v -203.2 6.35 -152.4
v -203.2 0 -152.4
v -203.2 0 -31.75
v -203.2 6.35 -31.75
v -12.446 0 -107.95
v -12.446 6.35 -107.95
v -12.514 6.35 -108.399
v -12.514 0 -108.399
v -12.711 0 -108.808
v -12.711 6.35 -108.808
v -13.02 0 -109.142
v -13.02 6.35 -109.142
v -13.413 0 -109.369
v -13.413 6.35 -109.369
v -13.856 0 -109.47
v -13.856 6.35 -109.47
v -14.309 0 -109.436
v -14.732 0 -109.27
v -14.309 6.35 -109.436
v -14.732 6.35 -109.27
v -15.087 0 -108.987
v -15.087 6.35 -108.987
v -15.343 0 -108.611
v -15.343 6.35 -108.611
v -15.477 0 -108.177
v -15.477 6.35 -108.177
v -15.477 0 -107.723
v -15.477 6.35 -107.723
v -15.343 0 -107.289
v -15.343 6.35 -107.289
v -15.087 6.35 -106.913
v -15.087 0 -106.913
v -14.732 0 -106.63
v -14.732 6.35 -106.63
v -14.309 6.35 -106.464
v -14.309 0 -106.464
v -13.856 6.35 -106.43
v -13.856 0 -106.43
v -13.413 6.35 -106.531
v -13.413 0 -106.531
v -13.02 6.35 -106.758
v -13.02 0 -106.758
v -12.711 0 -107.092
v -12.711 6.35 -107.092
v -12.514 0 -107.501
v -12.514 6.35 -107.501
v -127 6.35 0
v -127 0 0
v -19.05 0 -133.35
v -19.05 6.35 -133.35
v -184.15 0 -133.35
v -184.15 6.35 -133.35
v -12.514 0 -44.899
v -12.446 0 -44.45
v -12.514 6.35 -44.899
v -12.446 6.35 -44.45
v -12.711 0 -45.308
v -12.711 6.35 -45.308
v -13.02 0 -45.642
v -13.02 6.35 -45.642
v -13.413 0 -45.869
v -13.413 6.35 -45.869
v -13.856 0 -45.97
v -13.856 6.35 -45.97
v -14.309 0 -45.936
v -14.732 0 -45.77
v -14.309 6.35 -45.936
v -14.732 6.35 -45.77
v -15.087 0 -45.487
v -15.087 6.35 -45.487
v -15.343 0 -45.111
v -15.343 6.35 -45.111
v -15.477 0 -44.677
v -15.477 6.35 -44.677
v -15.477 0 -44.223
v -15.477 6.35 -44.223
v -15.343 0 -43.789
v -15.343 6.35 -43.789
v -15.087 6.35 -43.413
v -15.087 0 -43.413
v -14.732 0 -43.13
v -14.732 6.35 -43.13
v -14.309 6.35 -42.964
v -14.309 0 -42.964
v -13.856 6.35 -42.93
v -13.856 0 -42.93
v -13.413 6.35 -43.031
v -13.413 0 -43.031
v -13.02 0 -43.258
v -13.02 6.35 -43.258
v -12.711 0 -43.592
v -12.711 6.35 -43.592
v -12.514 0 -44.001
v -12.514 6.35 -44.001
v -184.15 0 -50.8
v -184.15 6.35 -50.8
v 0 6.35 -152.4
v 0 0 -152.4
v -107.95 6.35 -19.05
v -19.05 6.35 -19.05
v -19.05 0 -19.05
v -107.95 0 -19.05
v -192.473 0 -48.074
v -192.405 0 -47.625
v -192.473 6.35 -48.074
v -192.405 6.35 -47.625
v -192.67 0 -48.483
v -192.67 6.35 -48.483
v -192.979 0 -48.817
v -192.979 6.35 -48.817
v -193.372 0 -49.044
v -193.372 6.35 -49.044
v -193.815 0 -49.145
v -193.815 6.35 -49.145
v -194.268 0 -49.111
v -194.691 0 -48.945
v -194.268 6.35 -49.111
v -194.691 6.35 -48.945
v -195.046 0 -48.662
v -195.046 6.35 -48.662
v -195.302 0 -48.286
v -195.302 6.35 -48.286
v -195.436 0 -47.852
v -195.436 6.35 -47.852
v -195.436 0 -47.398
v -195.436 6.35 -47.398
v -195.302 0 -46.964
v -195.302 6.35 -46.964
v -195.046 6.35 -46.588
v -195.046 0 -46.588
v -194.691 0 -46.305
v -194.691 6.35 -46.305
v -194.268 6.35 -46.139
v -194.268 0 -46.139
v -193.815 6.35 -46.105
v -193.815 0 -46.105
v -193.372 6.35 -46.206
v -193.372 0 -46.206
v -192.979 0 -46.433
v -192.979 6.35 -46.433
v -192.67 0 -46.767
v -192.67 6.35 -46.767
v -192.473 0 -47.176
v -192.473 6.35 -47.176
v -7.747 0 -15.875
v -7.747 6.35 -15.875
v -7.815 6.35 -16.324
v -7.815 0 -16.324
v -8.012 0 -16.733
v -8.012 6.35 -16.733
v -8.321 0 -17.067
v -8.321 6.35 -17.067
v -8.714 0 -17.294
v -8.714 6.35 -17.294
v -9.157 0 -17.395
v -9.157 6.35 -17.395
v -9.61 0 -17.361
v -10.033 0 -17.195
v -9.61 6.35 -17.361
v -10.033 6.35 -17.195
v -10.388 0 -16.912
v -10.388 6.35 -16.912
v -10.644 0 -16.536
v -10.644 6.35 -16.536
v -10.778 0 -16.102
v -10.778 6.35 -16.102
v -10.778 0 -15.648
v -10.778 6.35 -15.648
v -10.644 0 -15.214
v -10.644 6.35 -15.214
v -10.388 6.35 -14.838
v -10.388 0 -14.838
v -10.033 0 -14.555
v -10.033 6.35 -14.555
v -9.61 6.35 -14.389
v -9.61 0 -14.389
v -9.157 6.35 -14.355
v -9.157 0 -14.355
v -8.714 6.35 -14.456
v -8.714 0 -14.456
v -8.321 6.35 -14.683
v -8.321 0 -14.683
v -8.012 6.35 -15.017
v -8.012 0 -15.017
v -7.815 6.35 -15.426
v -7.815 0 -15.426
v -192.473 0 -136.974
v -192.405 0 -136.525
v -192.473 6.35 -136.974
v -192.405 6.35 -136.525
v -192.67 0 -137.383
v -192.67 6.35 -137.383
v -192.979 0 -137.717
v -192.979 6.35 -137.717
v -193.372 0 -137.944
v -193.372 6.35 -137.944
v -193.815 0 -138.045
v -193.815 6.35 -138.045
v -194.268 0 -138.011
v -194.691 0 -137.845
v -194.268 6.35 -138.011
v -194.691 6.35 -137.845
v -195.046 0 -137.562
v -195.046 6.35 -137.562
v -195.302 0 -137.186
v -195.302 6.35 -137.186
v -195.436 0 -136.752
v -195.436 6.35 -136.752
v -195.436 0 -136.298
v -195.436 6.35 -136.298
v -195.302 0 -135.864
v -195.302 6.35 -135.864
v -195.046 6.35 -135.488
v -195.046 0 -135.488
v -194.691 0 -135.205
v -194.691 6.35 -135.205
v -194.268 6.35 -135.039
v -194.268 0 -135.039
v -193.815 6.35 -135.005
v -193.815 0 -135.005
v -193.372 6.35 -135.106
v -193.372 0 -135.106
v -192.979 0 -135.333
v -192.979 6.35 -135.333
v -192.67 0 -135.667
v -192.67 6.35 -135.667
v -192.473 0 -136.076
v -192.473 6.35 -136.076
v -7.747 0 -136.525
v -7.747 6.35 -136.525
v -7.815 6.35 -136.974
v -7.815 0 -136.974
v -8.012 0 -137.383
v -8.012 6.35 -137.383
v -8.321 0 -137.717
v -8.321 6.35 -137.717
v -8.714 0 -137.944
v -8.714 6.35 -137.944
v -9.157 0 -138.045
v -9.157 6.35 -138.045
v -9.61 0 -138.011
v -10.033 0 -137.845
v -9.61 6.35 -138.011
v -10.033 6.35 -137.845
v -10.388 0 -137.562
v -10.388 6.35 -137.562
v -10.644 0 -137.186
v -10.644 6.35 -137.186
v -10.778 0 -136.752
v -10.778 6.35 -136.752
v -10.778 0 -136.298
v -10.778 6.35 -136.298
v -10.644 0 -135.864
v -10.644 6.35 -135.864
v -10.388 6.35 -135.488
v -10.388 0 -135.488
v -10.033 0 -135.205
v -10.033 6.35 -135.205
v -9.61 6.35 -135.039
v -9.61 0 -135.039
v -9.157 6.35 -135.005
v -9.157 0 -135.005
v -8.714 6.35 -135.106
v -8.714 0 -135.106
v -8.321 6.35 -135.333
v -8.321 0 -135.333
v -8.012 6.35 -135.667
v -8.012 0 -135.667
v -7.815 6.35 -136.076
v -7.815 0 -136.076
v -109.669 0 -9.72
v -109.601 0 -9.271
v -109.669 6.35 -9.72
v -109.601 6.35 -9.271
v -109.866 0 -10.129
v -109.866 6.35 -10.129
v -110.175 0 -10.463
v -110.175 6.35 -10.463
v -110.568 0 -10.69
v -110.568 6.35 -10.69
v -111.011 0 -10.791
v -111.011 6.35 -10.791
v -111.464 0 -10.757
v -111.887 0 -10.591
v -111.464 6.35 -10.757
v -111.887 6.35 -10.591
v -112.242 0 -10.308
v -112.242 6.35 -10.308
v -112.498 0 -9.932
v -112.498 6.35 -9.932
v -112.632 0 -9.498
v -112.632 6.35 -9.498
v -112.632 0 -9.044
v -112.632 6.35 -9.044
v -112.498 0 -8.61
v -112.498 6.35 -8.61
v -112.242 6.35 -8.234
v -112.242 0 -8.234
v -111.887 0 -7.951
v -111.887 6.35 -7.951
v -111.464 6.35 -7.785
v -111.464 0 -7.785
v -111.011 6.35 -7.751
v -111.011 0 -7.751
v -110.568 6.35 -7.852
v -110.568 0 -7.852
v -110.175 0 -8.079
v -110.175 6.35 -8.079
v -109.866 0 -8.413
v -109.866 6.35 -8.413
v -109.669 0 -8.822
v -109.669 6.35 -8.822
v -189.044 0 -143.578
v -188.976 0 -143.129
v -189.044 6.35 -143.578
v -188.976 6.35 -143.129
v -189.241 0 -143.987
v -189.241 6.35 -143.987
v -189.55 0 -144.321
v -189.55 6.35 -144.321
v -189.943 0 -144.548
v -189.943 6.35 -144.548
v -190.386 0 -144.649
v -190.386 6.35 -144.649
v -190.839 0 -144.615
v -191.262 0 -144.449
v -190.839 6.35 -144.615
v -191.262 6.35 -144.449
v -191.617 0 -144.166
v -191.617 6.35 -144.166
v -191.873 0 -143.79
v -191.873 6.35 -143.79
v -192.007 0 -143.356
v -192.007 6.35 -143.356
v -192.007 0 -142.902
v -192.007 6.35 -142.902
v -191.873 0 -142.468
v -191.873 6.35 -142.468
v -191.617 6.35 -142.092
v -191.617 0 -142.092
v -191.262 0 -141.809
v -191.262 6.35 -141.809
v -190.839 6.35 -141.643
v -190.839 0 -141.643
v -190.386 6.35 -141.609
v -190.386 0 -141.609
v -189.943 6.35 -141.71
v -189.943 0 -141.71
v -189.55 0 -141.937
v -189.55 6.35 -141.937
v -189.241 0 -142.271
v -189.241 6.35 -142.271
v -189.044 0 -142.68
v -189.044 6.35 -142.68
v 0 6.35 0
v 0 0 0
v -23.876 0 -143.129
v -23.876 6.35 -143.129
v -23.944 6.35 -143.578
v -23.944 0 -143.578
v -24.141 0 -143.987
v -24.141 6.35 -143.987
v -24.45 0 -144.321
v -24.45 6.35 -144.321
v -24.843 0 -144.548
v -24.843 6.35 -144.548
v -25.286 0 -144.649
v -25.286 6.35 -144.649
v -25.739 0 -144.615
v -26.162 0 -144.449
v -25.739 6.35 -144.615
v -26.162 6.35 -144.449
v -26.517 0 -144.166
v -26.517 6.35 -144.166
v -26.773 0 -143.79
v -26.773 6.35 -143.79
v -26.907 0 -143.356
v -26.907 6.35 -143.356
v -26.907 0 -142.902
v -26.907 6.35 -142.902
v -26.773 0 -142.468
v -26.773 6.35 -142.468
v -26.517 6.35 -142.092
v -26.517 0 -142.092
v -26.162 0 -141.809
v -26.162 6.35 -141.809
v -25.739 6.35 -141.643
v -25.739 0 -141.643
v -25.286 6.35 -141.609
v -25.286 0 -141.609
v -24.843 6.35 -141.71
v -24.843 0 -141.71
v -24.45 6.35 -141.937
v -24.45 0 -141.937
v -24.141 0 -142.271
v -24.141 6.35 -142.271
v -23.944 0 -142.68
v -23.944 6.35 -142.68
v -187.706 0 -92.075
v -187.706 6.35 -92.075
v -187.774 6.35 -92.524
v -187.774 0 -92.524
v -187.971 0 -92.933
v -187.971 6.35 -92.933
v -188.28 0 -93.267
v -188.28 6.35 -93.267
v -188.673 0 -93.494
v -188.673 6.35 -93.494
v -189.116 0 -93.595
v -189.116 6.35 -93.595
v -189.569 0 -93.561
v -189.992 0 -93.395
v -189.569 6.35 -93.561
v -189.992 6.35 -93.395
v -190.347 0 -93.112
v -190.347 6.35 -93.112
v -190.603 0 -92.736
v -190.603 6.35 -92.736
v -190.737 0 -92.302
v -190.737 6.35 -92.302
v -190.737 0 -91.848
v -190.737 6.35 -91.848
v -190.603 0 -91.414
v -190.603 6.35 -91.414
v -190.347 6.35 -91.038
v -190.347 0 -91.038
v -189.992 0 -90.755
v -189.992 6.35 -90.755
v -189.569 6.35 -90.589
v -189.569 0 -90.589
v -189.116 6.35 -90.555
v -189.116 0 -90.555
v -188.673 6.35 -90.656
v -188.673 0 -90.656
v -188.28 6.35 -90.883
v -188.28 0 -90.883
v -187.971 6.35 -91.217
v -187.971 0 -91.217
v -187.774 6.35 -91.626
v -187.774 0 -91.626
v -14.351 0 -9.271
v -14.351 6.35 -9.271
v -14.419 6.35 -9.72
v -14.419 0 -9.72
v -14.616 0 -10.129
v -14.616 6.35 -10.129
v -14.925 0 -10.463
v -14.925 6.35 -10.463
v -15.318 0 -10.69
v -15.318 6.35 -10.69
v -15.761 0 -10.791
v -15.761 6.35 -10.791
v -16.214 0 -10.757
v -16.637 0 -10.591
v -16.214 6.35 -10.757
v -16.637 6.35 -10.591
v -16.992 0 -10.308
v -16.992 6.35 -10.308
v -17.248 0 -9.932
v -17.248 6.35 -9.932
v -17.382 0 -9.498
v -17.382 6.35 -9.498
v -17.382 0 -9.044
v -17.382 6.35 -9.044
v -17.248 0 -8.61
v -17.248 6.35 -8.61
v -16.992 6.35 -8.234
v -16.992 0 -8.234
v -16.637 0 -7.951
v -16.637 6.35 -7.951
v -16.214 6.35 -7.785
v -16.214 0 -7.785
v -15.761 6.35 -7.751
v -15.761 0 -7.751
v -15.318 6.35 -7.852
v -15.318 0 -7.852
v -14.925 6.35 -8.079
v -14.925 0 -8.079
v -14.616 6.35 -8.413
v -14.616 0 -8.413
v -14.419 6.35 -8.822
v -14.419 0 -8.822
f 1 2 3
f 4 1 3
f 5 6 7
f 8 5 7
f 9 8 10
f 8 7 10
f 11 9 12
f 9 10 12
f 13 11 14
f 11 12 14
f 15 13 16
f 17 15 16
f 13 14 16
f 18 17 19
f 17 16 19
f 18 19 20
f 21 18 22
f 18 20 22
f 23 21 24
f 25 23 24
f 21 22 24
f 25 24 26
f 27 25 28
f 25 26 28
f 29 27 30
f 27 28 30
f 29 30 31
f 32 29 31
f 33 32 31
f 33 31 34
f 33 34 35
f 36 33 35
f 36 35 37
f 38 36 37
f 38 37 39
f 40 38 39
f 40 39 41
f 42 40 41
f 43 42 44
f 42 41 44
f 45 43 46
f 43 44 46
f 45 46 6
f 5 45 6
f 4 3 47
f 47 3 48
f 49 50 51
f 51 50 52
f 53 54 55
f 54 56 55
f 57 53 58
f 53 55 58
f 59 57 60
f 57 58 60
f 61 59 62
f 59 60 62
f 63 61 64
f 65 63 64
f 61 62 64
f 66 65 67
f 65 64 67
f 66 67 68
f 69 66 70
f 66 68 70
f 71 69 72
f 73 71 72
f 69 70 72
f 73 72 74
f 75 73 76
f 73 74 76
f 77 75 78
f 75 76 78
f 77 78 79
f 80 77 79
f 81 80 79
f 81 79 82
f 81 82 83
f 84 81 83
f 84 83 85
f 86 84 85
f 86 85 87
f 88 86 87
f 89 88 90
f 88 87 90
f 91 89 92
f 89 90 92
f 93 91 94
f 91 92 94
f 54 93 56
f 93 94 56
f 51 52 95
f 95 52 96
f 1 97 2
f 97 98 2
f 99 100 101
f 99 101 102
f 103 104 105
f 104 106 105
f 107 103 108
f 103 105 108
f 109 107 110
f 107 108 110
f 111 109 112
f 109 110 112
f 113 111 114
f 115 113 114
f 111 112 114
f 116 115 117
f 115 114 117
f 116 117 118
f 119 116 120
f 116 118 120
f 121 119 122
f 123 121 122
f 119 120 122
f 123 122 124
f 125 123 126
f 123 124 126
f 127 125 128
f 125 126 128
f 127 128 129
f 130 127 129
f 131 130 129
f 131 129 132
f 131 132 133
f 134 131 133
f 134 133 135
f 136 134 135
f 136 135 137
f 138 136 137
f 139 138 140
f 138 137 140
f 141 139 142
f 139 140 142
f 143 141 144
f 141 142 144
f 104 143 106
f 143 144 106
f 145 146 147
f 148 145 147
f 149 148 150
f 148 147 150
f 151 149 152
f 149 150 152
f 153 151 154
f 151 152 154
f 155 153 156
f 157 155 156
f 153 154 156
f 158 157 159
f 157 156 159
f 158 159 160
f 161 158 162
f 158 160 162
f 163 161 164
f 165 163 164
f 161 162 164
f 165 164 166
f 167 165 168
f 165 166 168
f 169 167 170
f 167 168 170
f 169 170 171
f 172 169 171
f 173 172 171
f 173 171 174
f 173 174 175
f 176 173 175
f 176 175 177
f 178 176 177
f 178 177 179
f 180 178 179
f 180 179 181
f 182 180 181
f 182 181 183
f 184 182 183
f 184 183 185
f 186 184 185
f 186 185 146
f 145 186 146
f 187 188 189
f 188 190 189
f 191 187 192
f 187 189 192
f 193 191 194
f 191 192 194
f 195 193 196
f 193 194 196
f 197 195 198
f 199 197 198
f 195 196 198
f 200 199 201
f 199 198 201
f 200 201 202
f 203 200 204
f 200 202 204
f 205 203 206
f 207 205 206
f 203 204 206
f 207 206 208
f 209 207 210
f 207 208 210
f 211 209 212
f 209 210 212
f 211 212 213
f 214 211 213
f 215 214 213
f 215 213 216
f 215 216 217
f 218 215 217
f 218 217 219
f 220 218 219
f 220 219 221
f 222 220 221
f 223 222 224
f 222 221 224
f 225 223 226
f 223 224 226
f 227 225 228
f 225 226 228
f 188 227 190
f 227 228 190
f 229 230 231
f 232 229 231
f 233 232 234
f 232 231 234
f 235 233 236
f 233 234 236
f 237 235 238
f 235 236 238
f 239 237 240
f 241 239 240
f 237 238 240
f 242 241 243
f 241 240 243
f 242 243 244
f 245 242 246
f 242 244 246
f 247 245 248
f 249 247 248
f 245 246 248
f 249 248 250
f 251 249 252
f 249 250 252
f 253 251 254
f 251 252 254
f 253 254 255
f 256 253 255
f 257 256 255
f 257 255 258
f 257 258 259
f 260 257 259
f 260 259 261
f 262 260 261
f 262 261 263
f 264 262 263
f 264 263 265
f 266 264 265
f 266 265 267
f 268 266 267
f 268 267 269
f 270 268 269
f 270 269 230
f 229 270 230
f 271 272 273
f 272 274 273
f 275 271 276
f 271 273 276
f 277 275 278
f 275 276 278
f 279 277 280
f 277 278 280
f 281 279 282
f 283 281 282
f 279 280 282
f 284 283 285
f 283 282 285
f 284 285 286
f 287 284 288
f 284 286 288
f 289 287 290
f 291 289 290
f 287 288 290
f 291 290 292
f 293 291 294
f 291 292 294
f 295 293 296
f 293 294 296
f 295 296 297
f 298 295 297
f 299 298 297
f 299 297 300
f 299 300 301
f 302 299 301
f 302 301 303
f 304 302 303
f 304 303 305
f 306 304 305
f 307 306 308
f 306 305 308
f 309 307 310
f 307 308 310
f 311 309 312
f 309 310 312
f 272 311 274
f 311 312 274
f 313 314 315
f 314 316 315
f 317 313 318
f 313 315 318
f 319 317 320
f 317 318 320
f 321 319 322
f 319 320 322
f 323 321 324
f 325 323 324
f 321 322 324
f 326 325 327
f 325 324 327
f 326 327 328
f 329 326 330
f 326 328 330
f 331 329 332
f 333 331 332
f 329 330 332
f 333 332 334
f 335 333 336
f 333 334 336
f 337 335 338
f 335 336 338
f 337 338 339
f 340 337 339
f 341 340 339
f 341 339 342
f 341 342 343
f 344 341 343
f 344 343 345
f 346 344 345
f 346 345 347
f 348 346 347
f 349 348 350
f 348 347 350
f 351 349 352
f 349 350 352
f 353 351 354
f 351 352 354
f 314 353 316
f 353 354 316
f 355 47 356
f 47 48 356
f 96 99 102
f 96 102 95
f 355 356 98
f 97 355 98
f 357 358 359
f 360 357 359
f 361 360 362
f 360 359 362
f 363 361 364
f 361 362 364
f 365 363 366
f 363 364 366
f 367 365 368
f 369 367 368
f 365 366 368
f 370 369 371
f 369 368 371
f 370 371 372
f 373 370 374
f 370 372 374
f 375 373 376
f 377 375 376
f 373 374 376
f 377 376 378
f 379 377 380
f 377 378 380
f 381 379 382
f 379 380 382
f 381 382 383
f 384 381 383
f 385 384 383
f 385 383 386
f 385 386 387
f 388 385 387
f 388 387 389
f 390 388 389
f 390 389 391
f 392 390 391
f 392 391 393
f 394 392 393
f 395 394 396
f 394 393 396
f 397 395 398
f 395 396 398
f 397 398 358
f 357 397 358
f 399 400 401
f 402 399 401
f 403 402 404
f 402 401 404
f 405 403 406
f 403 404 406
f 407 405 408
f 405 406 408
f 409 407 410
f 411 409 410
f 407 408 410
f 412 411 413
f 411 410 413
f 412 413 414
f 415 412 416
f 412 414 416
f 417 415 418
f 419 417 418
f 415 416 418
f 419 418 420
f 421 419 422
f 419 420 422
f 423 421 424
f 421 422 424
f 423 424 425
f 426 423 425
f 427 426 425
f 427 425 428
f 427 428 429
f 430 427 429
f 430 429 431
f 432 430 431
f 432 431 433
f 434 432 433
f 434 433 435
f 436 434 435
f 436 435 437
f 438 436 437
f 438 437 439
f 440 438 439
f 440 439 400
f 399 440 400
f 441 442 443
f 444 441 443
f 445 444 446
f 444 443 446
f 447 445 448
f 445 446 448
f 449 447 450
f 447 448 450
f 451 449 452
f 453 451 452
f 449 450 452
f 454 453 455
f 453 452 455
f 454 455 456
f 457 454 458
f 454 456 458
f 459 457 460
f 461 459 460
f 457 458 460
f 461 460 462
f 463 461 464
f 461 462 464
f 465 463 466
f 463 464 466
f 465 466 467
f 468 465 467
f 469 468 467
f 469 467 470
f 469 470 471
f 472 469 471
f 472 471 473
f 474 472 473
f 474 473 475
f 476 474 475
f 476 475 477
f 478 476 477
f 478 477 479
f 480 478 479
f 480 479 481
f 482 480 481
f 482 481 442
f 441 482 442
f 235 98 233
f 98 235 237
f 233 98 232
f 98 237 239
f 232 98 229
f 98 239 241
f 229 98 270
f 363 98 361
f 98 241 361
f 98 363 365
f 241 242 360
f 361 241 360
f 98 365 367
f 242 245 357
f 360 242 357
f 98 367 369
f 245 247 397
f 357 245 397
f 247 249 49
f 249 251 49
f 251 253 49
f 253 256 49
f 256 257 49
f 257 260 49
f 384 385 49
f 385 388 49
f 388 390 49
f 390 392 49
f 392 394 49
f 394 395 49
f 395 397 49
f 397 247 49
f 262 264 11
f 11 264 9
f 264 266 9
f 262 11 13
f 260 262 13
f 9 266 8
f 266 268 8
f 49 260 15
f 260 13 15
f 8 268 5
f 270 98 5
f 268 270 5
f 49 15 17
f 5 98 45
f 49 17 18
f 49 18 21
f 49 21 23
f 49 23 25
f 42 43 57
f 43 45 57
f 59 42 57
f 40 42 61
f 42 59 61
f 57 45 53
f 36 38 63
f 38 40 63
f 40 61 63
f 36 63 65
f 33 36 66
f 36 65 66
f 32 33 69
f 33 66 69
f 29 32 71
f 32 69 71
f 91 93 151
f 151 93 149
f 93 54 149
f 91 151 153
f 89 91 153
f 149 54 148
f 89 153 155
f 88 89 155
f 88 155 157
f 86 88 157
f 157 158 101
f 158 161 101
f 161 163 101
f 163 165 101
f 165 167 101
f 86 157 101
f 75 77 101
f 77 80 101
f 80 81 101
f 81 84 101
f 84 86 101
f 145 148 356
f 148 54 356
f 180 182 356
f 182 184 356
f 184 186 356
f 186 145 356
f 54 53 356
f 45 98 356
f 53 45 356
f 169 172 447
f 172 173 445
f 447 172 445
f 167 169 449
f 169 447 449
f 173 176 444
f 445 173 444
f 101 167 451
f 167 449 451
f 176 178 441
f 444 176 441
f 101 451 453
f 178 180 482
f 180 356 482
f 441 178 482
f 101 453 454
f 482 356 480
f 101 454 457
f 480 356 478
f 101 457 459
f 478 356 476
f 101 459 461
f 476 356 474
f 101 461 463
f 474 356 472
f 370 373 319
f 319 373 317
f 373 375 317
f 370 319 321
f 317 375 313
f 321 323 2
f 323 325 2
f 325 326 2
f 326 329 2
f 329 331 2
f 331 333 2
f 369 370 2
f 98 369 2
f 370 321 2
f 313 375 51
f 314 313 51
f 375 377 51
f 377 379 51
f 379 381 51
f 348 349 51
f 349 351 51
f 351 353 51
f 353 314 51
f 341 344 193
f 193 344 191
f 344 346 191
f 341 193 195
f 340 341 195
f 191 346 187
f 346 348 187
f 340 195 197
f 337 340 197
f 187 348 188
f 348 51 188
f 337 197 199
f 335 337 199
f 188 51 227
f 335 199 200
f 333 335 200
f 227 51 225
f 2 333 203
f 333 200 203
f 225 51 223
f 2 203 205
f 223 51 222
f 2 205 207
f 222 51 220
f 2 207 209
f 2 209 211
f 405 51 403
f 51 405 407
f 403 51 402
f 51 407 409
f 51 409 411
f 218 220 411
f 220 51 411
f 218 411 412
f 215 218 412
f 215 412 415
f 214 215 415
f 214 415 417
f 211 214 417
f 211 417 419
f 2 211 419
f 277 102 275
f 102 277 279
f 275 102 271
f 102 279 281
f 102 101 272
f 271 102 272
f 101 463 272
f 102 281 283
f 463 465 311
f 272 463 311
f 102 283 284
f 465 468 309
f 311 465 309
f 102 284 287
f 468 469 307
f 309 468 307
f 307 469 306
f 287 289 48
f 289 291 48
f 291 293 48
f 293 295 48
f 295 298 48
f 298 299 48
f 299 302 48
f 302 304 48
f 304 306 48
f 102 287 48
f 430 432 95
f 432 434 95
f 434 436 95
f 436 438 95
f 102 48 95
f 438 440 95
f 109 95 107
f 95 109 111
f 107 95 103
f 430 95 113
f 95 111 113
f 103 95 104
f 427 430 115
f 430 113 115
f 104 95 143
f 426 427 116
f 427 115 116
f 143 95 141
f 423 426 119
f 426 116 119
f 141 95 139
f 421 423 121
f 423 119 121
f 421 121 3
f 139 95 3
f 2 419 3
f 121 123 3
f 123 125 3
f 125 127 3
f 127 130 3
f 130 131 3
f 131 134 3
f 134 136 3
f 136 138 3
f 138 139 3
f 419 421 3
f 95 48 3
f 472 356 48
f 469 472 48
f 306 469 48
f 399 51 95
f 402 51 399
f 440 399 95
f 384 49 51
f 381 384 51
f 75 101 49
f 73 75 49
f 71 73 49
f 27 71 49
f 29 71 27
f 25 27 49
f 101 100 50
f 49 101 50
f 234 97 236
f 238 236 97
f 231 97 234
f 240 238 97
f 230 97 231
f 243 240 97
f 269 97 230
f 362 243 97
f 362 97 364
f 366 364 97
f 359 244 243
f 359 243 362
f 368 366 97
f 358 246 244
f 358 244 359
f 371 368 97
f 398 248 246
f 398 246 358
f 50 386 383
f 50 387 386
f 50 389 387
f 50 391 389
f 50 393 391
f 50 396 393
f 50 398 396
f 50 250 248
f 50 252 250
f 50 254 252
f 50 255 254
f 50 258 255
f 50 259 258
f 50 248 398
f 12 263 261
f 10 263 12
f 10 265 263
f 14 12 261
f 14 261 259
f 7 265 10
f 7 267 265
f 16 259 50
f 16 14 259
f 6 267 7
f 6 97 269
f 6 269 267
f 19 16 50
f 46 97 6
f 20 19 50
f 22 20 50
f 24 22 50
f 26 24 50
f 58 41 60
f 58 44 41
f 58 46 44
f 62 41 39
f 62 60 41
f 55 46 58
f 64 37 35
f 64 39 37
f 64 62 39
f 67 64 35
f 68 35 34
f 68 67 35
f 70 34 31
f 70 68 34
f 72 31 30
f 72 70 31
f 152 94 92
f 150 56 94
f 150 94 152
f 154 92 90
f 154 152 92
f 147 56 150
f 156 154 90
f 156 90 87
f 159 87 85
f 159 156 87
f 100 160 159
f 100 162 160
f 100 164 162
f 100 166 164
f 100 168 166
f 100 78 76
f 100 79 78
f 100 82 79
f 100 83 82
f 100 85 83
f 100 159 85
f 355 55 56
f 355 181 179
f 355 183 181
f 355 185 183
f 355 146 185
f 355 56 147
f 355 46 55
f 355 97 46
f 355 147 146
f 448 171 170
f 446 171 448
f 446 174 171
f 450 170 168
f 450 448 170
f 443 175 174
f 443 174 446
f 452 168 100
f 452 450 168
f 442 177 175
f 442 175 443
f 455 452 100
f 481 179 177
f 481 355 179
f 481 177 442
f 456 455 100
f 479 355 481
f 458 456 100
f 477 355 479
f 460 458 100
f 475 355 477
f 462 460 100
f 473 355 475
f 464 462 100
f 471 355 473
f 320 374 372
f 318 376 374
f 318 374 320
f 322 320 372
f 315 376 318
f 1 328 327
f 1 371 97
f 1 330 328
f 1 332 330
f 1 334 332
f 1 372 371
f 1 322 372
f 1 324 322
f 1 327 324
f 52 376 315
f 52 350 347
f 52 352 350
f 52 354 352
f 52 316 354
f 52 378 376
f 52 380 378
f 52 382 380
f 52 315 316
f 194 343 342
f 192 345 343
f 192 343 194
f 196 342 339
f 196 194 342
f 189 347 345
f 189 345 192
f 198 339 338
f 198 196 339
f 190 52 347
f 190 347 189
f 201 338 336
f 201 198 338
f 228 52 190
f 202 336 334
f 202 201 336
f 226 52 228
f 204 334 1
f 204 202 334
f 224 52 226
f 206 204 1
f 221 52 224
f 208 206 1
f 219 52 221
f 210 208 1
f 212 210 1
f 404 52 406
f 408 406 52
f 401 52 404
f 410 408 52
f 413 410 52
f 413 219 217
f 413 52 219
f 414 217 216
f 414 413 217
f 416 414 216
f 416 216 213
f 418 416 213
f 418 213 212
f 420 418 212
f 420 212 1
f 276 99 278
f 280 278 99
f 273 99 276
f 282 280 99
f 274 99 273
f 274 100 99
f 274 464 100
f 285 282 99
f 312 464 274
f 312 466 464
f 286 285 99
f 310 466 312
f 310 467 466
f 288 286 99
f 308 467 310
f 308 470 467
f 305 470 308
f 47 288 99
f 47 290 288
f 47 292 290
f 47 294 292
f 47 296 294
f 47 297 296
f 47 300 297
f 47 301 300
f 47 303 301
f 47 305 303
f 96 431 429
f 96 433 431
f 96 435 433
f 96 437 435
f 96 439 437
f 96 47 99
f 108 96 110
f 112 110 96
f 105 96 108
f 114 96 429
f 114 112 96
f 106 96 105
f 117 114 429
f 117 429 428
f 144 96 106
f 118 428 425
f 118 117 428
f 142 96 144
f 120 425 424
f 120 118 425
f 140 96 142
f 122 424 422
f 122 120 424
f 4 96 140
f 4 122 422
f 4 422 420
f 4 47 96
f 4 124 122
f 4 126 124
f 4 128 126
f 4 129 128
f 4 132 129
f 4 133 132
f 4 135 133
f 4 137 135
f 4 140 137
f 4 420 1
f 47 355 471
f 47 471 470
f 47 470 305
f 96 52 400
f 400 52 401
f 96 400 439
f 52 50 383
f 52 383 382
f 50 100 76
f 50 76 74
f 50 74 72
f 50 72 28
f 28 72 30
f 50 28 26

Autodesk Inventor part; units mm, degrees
ref_plane "YZ Plane" through (0, 0, 0) normal (1, 0, 0) x (0, 1, 0)
ref_plane "XZ Plane" through (0, 0, 0) normal (0, 1, 0) x (-1, 0, 0)
ref_plane "XY Plane" through (0, 0, 0) normal (0, 0, 1) x (1, 0, 0)
sketch "Sketch1" plane through (0, 0, 0) normal (0, 1, 0) x (-1, 0, 0)
  line L0 (0, 0) -> (0, -152.4)
  line L1 (0, -152.4) -> (203.2, -152.4)
  line L2 (203.2, -152.4) -> (203.2, -31.75)
  line L3 (203.2, -31.75) -> (127, 0)
  line L4 (127, 0) -> (0, 0)
  dimension "d0" = 120.65
  dimension "d1" = 203.2
  dimension "d2" = 127
  dimension "d3" = 152.4
extrude "Extrusion1" add sketch "Sketch1" along normal blind 6.35
sketch "Sketch3" plane through (0, 6.35, 0) normal (0, 1, 0) x (1, 0, 0)
  line L0 (0, 0) -> (0, 152.4) projected
  line L1 (0, 152.4) -> (-203.2, 152.4) projected
  line L2 (-203.2, 152.4) -> (-203.2, 31.75) projected
  line L3 (-203.2, 31.75) -> (-127, 0) projected
  line L4 (-127, 0) -> (0, 0) projected
  line L5 (-19.05, 19.05) -> (-19.05, 133.35)
  line L6 (-19.05, 133.35) -> (-184.15, 133.35)
  line L7 (-184.15, 133.35) -> (-184.15, 50.8)
  line L8 (-19.05, 19.05) -> (-107.95, 19.05)
  line L9 (-107.95, 19.05) -> (-184.15, 50.8)
  circle A0 centre (-9.271, 15.875) radius 1.524
  circle A1 centre (-9.271, 136.525) radius 1.524
  circle A2 centre (-25.4, 143.129) radius 1.524
  circle A3 centre (-190.5, 143.129) radius 1.524
  circle A4 centre (-193.929, 47.625) radius 1.524
  circle A5 centre (-193.929, 136.525) radius 1.524
  circle A6 centre (-15.875, 9.271) radius 1.524
  circle A7 centre (-111.125, 9.271) radius 1.524
  dimension "d10" = 120.65
  dimension "d11" = 82.55
  dimension "d12" = 203.2
  dimension "d13" = 165.1
  dimension "d14" = 114.3
  dimension "d15" = 88.9
  dimension "d16" = 19.05
  dimension "d17" = 19.05
  dimension "d18" = 3.048
  dimension "d19" = 3.048
  dimension "d20" = 120.65
  dimension "d21" = 3.048
  dimension "d22" = 3.048
  dimension "d23" = 15.875
  dimension "d24" = 9.271
  dimension "d25" = 9.271
  dimension "d26" = 9.271
  dimension "d27" = 25.4
  dimension "d28" = 12.7
  dimension "d29" = 9.271
  dimension "d30" = 3.048
  dimension "d31" = 3.048
  dimension "d32" = 88.9
  dimension "d33" = 15.875
  dimension "d34" = 9.271
  dimension "d35" = 9.271
  dimension "d36" = 3.048
  dimension "d37" = 9.271
  dimension "d38" = 15.875
  dimension "d39" = 3.048
  dimension "d40" = 15.875
  dimension "d41" = 9.271
extrude "Extrusion2" cut sketch "Sketch3" against normal blind 6.35 contours L8 L9 L7 L6 L5 | A0 | A1 | A2 | A3 | A4 | A5 | A6 | A7
sketch "Sketch4" plane through (0, 6.35, 0) normal (0, 1, 0) x (1, 0, 0)
  circle A0 centre (-13.97, 44.45) radius 1.524
  circle A1 centre (-13.97, 107.95) radius 1.524
  circle A2 centre (-189.23, 92.075) radius 1.524
  line L0 (-107.95, 19.05) -> (-184.15, 50.8) projected
  line L1 (-184.15, 50.8) -> (-184.15, 133.35) projected
  line L2 (-19.05, 133.35) -> (-19.05, 19.05) projected
  point P0 (0, 0)
  dimension "d44" = 3.048
  dimension "d45" = 3.048
  dimension "d46" = 3.048
  dimension "d47" = 82.55
  dimension "d48" = 41.275
  dimension "d49" = 5.08
  dimension "d50" = 25.4
  dimension "d51" = 25.4
  dimension "d52" = 5.08
  dimension "d53" = 5.08
extrude "Extrusion3" cut sketch "Sketch4" against normal blind 6.35
properties part number "Panel"
